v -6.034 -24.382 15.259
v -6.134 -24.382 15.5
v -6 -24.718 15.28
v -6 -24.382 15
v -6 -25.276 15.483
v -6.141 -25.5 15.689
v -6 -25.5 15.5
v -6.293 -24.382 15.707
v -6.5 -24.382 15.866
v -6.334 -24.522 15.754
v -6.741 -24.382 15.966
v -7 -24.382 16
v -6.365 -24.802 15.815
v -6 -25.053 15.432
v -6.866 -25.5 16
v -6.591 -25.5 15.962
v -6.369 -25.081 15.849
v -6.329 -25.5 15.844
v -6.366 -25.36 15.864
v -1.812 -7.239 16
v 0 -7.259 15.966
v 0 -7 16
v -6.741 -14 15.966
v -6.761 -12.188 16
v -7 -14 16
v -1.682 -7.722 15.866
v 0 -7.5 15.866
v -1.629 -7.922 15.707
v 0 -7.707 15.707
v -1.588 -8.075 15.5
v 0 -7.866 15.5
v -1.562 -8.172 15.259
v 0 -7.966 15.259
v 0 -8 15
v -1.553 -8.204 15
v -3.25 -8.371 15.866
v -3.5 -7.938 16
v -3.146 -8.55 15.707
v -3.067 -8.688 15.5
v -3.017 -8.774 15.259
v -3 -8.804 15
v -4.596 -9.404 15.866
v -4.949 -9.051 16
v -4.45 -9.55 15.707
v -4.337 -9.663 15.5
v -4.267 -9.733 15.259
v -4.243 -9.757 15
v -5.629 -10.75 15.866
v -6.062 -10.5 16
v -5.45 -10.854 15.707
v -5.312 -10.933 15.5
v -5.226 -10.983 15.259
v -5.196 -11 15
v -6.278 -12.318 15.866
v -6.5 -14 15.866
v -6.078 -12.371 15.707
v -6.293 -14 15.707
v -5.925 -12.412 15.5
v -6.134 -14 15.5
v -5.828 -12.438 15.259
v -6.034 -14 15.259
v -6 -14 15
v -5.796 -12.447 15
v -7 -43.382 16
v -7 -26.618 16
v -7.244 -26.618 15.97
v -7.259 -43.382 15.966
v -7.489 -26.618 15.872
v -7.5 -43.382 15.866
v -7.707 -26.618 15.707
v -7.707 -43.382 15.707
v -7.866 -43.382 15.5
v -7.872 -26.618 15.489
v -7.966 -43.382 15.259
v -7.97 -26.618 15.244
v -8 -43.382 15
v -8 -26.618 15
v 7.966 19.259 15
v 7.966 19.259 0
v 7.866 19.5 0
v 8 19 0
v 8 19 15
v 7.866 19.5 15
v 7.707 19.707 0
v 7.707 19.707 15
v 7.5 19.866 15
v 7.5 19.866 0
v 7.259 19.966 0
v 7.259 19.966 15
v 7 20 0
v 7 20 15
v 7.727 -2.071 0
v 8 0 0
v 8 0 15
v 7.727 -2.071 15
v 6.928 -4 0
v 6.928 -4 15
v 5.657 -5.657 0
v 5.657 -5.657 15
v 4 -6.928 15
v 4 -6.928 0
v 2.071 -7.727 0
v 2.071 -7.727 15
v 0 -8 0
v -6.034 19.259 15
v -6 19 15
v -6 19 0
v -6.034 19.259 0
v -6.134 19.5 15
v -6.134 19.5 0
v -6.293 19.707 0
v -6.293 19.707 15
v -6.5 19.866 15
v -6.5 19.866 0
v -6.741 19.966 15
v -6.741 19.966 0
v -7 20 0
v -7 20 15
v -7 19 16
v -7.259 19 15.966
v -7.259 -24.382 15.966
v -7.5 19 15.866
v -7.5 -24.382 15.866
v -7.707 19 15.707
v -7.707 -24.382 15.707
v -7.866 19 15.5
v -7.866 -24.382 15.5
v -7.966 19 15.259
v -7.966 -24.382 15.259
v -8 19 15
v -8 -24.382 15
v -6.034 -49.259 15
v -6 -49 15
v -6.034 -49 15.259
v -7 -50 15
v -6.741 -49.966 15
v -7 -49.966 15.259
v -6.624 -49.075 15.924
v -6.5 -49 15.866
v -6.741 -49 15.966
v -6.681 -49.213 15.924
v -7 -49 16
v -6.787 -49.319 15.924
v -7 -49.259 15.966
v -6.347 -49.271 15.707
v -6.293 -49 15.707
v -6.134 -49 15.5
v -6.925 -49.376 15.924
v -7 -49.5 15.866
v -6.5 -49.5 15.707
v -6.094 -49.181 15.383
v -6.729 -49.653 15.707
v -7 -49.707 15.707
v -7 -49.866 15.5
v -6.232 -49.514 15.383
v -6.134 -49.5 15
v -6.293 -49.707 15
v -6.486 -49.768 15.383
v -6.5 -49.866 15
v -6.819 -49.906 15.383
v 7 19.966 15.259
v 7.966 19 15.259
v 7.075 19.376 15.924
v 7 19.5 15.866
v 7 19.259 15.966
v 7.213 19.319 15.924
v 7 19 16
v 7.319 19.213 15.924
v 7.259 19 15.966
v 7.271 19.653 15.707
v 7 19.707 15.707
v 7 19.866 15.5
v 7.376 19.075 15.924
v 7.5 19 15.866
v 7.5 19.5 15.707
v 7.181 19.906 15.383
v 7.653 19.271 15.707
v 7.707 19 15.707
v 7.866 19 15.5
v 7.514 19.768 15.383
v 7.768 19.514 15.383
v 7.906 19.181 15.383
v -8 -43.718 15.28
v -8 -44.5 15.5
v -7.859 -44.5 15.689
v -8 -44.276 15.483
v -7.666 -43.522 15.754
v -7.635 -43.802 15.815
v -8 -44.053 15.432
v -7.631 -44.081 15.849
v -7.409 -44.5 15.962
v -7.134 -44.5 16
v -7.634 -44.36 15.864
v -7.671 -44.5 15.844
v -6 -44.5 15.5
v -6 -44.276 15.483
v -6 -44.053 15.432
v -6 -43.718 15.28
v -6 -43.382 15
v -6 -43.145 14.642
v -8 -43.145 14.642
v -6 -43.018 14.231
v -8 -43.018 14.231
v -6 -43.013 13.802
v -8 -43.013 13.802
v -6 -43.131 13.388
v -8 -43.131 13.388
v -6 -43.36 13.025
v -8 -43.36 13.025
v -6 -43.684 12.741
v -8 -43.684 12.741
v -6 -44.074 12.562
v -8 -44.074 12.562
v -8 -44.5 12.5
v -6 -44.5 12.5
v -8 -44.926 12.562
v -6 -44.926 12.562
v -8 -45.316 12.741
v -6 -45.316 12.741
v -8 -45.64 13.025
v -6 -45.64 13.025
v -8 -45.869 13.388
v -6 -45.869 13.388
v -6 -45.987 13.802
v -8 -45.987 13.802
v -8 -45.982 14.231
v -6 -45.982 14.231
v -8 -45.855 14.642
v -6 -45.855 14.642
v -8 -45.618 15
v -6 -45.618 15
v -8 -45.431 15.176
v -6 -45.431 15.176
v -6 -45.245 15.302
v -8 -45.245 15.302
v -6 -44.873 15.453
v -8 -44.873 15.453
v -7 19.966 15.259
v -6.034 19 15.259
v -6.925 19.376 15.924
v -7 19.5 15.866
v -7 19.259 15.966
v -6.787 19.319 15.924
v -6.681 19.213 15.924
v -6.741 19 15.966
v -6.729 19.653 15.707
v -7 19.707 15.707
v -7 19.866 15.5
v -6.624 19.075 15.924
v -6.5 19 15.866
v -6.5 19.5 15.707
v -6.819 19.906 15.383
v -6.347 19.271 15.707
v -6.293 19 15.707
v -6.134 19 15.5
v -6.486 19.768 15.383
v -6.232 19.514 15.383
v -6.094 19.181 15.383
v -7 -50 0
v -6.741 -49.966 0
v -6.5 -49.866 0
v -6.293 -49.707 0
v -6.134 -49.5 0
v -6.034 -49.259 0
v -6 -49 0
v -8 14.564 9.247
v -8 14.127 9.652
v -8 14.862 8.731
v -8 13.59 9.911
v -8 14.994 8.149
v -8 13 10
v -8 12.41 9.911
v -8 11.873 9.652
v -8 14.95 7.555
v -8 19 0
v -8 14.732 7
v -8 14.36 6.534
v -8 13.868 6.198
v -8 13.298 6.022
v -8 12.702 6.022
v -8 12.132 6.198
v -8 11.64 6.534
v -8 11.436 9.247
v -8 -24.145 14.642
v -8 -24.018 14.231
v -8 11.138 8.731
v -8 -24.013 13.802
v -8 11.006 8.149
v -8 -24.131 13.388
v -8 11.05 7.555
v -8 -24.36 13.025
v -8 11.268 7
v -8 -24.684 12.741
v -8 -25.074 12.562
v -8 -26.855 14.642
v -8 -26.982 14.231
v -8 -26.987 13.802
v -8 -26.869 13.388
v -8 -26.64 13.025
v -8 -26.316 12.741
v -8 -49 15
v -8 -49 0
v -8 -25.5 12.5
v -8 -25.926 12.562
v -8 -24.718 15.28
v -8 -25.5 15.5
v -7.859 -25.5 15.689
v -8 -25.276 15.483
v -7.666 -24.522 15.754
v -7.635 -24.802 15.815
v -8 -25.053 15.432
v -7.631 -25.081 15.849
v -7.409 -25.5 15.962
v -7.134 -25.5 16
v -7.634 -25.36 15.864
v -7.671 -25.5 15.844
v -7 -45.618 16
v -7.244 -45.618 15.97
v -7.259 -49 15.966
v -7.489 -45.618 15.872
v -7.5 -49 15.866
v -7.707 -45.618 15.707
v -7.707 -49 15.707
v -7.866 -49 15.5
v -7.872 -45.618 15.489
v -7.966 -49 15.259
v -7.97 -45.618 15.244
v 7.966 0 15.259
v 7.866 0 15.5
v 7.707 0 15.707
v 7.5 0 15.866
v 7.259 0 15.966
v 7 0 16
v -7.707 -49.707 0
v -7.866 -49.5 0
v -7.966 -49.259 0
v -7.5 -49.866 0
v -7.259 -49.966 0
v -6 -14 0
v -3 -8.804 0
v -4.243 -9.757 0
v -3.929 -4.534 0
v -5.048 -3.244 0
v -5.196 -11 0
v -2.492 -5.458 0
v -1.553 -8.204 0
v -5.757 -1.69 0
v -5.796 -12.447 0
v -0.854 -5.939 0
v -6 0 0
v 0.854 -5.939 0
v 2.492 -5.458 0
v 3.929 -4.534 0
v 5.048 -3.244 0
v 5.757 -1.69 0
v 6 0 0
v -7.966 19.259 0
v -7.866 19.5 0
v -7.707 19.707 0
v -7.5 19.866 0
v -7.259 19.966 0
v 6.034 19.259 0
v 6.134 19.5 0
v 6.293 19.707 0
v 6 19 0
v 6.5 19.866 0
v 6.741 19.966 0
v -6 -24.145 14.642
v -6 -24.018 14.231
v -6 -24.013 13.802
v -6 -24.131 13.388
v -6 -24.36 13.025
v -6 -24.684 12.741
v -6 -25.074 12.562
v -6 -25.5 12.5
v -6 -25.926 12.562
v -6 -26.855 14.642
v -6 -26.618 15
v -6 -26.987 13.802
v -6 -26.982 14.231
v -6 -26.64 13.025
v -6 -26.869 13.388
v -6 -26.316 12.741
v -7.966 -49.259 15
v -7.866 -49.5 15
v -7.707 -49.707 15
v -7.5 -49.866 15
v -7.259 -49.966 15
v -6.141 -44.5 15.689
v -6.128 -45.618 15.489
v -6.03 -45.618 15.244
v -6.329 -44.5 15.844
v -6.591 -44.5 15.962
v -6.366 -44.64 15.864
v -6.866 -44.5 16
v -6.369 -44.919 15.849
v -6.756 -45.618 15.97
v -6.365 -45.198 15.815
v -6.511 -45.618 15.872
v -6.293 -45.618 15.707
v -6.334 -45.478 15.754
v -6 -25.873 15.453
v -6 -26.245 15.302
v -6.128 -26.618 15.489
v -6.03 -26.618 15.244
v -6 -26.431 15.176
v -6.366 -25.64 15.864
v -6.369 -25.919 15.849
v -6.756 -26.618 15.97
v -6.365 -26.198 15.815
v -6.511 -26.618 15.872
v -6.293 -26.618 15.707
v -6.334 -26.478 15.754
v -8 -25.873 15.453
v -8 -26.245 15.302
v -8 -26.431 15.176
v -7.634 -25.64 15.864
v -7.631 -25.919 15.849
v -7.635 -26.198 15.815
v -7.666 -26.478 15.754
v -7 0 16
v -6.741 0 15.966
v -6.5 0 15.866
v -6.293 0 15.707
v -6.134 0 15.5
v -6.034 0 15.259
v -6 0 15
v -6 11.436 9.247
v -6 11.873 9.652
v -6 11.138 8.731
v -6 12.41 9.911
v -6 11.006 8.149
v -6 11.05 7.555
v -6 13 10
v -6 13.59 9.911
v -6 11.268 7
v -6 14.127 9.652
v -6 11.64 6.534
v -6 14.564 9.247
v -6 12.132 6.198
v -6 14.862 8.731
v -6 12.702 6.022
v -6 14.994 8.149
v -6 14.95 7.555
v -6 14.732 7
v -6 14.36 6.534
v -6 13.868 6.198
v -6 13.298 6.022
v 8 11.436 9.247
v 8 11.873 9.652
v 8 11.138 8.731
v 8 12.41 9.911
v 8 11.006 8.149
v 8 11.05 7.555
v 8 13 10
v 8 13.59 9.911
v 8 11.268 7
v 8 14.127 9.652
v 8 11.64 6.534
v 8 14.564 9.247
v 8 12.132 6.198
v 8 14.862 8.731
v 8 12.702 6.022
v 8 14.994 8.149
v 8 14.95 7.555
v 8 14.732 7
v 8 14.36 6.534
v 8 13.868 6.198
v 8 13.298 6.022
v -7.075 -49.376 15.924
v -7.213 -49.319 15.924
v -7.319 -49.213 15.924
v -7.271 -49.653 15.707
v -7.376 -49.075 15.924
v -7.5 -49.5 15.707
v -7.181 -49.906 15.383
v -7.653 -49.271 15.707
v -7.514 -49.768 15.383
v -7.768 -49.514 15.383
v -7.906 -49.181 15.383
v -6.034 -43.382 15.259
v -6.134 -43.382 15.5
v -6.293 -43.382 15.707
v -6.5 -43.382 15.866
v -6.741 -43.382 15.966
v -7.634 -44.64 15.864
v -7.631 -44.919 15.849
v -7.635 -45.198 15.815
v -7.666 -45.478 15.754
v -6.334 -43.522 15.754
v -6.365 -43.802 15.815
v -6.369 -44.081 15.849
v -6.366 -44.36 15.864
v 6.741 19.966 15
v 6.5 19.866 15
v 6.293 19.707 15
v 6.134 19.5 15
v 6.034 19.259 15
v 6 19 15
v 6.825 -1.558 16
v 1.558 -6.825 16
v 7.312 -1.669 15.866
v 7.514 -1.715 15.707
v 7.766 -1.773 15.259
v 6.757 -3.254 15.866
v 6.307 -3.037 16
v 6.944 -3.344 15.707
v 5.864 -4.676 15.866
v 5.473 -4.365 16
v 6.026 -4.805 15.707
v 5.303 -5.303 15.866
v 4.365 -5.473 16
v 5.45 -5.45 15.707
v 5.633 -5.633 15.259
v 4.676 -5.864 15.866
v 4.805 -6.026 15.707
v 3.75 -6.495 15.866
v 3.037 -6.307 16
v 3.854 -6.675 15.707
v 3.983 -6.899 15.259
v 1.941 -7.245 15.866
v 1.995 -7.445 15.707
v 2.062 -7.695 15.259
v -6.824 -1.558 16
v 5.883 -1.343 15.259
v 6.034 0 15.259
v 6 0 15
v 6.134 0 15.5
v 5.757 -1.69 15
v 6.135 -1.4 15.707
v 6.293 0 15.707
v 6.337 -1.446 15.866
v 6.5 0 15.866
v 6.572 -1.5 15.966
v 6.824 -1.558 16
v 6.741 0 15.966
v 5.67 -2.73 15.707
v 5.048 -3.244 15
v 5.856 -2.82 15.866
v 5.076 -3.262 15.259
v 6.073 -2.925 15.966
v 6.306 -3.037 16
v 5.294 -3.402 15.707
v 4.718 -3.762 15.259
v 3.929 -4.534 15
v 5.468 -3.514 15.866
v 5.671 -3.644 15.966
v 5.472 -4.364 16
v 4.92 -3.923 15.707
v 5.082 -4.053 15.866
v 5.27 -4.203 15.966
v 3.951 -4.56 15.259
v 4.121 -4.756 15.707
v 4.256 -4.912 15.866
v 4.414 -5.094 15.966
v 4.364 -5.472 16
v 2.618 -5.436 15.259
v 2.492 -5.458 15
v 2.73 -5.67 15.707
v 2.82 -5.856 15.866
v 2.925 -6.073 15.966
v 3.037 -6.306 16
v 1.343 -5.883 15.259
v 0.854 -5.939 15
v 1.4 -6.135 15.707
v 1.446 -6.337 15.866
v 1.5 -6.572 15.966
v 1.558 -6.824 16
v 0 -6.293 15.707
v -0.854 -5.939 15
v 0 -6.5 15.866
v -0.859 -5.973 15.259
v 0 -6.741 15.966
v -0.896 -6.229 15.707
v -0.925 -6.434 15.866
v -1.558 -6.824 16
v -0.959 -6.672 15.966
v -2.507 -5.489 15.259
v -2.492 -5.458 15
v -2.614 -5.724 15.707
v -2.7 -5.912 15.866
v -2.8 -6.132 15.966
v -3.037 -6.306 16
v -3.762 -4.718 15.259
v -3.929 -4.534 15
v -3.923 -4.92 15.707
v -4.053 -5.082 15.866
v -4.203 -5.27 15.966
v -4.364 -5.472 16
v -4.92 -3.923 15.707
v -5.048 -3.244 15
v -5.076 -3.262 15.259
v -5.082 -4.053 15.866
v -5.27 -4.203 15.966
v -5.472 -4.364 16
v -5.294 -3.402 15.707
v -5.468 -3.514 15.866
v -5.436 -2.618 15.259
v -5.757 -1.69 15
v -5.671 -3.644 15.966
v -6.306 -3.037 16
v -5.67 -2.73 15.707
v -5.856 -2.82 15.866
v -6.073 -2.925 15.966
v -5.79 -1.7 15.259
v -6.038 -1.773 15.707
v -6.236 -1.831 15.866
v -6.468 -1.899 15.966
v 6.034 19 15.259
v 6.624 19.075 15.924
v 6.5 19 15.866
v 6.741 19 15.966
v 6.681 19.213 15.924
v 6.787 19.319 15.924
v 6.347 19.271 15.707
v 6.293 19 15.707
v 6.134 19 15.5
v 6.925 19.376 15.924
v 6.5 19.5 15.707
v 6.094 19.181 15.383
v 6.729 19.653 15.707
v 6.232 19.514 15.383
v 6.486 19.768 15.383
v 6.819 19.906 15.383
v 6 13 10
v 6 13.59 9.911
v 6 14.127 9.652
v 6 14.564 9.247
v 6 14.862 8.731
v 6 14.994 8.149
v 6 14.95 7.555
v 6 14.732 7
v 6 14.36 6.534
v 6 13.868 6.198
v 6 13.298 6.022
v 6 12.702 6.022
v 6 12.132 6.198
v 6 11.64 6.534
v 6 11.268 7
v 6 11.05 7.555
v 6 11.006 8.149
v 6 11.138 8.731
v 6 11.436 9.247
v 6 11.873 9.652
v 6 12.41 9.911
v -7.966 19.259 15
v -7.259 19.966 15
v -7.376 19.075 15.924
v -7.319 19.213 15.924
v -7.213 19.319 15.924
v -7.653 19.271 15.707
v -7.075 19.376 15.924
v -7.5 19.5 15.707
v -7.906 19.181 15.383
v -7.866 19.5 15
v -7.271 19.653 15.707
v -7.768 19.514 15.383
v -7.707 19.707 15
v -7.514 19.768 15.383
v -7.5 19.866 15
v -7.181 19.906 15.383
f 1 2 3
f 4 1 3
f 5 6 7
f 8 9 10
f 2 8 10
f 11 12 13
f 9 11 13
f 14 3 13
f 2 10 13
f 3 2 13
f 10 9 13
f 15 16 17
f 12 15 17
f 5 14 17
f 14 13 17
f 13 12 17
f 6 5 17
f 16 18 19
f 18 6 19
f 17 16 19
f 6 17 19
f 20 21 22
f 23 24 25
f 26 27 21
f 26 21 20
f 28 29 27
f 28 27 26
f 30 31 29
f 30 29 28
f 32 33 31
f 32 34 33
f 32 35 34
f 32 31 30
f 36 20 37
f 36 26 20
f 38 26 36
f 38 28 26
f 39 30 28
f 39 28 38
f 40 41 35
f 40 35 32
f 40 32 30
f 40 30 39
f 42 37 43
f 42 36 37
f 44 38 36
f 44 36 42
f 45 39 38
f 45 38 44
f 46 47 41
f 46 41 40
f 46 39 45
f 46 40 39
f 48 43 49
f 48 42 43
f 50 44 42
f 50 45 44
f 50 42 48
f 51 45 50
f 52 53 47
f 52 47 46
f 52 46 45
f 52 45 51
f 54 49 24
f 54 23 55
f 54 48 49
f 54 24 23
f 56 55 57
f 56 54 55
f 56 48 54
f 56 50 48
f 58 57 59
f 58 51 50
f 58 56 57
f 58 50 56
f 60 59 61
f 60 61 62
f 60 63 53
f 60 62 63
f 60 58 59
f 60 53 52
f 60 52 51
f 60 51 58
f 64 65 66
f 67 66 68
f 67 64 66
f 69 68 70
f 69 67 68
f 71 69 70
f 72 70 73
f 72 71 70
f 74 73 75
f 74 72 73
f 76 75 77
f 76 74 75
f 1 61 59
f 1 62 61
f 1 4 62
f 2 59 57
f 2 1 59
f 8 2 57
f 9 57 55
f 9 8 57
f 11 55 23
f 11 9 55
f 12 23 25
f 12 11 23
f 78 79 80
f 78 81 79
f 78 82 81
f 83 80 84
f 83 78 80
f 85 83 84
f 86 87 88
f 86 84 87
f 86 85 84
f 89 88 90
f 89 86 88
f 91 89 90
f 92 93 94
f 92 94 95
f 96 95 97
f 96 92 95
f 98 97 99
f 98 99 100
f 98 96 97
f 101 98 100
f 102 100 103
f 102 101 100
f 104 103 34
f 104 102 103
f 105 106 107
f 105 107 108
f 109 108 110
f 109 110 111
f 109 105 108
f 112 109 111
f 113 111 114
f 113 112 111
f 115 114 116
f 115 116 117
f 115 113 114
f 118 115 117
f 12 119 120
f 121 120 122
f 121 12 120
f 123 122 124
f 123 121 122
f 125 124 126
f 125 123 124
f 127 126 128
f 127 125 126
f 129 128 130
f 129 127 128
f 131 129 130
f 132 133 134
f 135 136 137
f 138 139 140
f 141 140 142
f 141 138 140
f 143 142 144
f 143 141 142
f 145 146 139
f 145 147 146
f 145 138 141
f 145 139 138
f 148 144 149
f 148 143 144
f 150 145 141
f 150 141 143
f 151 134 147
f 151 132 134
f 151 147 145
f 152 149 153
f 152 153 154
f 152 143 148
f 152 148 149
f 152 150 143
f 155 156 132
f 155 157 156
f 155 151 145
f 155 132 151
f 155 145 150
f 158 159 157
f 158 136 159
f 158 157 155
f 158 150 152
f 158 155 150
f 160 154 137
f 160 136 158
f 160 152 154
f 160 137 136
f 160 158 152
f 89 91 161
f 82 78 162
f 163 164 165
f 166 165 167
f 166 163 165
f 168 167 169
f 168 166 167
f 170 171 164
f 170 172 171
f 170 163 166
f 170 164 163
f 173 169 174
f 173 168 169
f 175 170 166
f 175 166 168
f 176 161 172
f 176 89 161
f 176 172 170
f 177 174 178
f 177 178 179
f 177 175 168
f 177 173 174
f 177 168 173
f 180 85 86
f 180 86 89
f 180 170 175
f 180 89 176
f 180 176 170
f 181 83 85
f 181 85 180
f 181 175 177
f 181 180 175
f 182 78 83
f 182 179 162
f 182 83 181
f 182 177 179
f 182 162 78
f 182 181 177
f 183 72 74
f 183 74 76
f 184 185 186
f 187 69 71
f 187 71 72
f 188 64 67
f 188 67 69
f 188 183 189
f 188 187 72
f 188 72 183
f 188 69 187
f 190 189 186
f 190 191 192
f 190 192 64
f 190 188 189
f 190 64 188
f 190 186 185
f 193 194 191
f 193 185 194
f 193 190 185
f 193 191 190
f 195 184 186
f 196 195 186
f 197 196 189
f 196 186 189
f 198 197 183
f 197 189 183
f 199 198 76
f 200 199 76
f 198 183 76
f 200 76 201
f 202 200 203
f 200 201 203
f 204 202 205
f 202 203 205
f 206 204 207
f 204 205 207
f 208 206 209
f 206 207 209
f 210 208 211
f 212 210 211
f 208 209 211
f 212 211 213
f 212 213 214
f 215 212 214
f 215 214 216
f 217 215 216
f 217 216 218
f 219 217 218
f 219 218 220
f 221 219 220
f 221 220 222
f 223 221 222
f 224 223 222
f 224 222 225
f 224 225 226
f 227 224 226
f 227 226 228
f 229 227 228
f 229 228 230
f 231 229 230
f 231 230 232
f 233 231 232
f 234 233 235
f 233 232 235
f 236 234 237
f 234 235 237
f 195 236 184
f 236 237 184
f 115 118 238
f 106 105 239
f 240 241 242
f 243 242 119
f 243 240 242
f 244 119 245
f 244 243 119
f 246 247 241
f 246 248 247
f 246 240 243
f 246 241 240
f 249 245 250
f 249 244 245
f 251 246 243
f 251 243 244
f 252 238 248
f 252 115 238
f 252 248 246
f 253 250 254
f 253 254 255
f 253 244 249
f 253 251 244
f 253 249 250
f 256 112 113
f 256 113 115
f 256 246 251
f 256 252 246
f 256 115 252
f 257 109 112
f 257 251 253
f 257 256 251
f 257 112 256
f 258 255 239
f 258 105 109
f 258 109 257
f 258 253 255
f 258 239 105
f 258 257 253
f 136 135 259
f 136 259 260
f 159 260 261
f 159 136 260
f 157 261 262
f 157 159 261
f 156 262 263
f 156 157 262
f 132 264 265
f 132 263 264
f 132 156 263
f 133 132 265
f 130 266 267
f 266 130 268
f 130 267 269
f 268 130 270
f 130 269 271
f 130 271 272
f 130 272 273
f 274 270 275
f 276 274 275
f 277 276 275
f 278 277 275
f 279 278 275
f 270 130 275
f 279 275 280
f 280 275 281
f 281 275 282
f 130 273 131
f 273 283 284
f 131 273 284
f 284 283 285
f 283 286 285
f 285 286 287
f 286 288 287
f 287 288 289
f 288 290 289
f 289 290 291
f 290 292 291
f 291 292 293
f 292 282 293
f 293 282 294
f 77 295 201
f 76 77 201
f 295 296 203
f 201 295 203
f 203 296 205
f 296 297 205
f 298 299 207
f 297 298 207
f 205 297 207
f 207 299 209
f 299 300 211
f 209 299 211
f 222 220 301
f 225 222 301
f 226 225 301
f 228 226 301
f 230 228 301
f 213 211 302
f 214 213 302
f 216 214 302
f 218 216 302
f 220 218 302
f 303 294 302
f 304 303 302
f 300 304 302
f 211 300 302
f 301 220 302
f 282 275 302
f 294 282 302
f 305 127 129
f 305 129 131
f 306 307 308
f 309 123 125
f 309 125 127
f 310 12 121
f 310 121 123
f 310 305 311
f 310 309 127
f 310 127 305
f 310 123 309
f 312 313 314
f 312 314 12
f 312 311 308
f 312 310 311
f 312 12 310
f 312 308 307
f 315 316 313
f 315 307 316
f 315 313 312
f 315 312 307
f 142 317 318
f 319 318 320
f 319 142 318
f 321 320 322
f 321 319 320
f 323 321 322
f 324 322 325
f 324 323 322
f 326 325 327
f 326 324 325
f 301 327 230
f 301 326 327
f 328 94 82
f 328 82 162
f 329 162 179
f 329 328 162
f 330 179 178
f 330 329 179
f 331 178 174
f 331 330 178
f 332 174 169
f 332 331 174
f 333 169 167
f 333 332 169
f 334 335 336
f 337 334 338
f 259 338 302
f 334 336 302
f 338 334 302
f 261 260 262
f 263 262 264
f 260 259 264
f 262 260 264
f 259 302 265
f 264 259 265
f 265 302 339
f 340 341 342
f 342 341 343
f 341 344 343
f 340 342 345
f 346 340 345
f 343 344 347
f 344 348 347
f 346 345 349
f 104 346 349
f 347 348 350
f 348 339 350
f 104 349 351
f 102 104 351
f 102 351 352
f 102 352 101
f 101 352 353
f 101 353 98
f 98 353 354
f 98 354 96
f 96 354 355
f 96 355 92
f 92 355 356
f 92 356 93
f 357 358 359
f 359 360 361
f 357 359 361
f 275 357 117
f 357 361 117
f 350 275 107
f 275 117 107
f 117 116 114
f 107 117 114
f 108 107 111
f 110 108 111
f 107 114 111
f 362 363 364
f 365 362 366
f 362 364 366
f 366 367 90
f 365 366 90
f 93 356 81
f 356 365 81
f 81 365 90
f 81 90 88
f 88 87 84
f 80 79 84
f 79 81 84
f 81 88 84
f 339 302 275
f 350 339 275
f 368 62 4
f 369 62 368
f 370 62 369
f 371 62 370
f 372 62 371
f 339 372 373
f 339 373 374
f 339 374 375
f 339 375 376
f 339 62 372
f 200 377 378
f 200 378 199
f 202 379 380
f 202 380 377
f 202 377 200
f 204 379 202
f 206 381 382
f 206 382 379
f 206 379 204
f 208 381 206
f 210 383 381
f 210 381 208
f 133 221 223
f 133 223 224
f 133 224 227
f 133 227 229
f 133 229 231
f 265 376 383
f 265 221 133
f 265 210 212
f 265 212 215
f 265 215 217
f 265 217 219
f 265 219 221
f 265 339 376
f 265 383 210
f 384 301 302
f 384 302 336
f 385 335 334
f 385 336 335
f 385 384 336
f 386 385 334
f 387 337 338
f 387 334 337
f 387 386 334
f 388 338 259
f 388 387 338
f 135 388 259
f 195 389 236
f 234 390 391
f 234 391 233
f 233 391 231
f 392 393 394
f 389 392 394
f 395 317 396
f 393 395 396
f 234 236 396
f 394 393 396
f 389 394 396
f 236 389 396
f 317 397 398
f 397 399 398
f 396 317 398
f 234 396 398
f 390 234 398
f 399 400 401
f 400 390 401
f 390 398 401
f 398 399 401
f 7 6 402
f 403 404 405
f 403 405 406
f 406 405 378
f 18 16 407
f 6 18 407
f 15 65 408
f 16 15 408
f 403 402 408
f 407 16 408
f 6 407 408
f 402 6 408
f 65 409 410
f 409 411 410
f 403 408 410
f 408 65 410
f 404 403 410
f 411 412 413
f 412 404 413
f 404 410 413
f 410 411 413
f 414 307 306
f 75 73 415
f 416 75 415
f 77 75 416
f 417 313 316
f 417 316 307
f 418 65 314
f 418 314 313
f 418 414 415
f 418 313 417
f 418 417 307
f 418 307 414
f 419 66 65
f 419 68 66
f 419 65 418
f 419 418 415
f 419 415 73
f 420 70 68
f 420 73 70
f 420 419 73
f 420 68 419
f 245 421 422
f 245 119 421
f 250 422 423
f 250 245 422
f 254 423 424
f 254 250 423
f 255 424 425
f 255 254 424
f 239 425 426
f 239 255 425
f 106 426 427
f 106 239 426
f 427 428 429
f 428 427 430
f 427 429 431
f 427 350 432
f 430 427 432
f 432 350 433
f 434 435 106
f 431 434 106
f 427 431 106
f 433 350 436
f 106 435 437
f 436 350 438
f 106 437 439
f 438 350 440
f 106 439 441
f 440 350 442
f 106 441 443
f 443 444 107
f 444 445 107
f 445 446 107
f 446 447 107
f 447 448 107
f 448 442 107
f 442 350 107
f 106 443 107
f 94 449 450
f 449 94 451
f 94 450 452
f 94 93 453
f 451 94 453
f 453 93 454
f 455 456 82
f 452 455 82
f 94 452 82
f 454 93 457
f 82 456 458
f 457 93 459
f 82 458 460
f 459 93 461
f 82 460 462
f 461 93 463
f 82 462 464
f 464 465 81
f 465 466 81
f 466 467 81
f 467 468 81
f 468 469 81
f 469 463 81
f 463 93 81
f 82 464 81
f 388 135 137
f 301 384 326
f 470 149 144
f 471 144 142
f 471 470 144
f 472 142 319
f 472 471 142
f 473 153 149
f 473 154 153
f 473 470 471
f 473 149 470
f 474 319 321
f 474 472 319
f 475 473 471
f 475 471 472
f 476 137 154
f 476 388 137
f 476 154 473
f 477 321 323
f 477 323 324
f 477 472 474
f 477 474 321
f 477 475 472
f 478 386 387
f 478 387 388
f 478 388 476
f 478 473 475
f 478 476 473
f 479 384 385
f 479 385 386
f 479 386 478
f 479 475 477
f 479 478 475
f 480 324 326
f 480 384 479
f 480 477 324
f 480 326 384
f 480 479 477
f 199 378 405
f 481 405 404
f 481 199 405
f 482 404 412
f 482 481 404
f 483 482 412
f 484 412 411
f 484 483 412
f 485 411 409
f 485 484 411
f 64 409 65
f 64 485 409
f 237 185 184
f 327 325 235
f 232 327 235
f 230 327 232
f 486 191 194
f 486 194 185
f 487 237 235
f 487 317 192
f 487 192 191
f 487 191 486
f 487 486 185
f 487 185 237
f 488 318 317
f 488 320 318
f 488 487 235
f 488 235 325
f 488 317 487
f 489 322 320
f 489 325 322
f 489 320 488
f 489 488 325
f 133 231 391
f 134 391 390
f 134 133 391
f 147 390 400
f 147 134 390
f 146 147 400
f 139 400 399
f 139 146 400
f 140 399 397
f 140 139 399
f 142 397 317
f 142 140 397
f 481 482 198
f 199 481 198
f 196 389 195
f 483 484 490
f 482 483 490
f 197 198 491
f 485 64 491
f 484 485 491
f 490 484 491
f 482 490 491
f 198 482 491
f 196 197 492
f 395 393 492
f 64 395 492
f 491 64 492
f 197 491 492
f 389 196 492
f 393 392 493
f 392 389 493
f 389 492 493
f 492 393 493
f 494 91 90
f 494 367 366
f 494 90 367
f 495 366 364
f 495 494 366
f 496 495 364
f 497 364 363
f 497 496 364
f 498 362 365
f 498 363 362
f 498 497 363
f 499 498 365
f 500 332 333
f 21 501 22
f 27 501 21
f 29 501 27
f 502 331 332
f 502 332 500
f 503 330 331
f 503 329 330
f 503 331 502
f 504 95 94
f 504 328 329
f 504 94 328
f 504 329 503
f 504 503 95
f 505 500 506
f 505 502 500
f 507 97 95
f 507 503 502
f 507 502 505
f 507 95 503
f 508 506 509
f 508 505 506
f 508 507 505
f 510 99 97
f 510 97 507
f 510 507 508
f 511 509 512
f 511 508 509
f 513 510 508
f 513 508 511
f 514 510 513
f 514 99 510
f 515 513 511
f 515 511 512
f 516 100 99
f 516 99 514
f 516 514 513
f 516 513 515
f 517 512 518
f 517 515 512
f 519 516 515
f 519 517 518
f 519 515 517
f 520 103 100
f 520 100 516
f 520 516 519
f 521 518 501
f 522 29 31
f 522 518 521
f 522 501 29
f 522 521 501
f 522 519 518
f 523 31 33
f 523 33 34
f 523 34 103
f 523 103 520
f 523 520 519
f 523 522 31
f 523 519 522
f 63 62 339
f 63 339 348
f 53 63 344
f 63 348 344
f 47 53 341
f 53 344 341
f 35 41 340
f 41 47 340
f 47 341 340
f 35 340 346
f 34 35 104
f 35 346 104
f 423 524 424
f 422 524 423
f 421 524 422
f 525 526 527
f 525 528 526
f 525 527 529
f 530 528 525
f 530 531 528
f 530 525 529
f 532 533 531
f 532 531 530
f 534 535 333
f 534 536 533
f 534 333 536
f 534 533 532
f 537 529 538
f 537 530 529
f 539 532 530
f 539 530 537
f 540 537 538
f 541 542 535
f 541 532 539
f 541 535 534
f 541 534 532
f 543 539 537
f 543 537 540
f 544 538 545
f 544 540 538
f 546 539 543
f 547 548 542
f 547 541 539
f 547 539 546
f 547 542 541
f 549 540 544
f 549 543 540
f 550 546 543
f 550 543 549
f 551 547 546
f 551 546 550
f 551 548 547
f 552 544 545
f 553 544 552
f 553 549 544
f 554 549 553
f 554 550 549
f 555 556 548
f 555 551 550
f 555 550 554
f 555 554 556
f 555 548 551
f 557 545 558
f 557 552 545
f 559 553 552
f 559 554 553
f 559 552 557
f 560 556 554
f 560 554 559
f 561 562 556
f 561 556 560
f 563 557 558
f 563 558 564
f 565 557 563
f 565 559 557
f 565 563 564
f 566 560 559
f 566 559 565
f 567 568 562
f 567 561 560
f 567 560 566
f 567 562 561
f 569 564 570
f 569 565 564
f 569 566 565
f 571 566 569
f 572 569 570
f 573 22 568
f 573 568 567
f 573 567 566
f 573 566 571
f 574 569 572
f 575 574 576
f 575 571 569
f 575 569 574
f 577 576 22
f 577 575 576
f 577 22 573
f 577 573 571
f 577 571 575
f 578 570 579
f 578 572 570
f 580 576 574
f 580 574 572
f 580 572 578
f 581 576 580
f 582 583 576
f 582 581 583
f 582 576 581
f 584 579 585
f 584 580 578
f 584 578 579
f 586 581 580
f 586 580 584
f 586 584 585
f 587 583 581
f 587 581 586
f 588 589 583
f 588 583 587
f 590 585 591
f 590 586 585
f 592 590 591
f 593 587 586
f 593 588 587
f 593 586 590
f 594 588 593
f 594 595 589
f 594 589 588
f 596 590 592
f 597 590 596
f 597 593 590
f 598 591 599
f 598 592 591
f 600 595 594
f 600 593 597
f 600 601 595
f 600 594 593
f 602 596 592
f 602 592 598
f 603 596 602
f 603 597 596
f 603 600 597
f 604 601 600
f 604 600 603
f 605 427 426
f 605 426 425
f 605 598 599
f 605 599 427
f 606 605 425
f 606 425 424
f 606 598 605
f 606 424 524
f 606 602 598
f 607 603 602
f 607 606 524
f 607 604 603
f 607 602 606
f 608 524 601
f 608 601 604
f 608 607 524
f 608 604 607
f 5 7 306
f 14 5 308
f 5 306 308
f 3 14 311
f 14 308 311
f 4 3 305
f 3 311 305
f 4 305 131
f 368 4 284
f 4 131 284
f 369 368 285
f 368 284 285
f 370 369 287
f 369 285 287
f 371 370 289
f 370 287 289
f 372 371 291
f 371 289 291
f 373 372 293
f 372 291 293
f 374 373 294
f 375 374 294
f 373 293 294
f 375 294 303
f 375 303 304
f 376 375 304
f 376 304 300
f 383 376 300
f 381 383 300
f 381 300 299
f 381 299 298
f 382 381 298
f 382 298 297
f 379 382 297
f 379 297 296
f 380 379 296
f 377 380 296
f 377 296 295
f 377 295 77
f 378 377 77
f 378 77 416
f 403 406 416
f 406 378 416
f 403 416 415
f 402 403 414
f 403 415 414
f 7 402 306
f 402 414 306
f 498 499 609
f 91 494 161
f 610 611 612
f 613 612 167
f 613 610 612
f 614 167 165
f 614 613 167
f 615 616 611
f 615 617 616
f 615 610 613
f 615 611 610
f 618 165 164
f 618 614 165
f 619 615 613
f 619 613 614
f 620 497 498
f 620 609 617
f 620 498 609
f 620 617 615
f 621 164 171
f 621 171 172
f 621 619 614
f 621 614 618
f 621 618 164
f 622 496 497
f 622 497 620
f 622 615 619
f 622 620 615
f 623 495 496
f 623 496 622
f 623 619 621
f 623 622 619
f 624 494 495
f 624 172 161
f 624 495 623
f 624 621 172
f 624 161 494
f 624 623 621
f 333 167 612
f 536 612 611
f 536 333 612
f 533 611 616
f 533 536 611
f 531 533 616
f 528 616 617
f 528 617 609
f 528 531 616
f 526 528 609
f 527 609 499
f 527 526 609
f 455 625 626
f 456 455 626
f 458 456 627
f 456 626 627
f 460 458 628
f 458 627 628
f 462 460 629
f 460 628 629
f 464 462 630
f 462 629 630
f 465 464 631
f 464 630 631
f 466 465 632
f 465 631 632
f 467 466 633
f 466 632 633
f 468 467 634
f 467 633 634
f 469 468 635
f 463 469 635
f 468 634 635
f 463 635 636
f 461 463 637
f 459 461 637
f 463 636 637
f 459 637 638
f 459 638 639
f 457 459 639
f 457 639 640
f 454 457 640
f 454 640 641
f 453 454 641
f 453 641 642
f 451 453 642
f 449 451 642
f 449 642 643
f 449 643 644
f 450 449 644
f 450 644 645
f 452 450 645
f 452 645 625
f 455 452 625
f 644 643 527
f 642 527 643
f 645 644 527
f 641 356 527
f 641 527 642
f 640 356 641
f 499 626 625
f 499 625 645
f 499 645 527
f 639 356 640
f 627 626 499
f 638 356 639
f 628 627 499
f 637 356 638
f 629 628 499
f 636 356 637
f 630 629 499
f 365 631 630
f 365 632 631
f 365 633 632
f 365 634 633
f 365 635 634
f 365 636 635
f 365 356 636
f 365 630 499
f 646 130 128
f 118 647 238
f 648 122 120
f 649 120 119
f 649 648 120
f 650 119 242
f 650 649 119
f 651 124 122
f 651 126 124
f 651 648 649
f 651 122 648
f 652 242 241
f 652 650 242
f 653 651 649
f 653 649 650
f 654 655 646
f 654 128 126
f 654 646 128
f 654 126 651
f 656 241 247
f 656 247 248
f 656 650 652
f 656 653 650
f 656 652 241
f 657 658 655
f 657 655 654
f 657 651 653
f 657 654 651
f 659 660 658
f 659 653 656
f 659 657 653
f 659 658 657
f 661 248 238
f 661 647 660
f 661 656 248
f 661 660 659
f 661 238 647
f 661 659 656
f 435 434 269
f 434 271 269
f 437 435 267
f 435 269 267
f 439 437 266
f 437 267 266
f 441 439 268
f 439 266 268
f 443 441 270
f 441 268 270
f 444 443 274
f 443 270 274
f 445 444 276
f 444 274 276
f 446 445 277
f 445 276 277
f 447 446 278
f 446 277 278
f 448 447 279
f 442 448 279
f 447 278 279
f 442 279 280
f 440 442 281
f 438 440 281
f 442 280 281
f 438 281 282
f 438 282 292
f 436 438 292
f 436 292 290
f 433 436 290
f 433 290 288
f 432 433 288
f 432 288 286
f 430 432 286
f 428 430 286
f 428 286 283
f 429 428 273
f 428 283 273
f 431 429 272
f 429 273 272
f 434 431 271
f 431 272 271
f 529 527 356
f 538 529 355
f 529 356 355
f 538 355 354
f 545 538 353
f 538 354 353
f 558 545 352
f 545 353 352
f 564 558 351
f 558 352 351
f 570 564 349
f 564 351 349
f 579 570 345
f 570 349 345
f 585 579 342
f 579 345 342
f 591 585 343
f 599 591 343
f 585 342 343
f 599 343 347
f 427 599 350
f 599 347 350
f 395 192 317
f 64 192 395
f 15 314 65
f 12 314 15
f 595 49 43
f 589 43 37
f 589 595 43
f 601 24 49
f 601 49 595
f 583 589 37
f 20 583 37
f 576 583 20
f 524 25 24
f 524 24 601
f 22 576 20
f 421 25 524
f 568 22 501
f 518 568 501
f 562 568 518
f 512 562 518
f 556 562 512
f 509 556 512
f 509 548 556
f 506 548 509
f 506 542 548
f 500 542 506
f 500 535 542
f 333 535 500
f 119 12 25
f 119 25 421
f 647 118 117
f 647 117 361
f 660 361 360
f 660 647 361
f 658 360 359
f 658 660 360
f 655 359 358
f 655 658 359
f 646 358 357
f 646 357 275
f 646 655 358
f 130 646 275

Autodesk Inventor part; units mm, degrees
ref_plane "YZ Plane" through (0, 0, 0) normal (1, 0, 0) x (0, 1, 0)
ref_plane "XZ Plane" through (0, 0, 0) normal (0, 1, 0) x (-1, 0, 0)
ref_plane "XY Plane" through (0, 0, 0) normal (0, 0, 1) x (1, 0, 0)
sketch "Sketch1" plane through (0, 0, 0) normal (0, 0, 1) x (1, 0, 0)
  arc A0 (-6, 0) -> (6, 0) centre (0, 0) ccw
  arc A1 (0, -8) -> (8, 0) centre (0, 0) ccw
  line L0 (-6, -14) -> (-6, -50)
  line L1 (-8, 0) -> (-8, -50)
  line L2 (-6, 0) -> (-6, 20)
  line L3 (-8, 0) -> (-8, 20)
  line L4 (6, 0) -> (6, 20)
  line L5 (8, 0) -> (8, 20)
  line L6 (-8, -50) -> (-6, -50)
  line L7 (26.4346, -8) -> (-30.23, -8) construction
  arc A2 (0, -8) -> (-6, -14) centre (0, -14) ccw
  line L8 (8, 20) -> (6, 20)
  line L9 (-6, 20) -> (-8, 20)
  arc A3 (6, 0) -> (-6, 0) centre (0, 0) ccw construction
  dimension "d0" = 12
  dimension "d1" = 2
  dimension "d2" = 42
  dimension "d3" = 20
  dimension "d4" = 20
extrude "Højde" add sketch "Sketch1" along normal blind 16
sketch "Sketch3" plane through (-8, -50, 0) normal (-1, 0, 0) x (0, 0, 1)
  line L0 (0, 0) -> (0, 70) projected
  line L1 (0, 0) -> (16, 0) projected
  line L2 (16, 70) -> (16, 0) projected
  line L3 (0, 70) -> (16, 70) projected
  line L4 (0, 42) -> (16, 42) projected
  circle A0 centre (14, 24.5) radius 1.5
  circle A1 centre (14, 5.5) radius 1.5
  line L5 (18.141, 23) -> (9.2635, 23) construction
  line L6 (18.6037, 7) -> (9.7262, 7) construction
  line L7 (14, 3.0673) -> (14, 29.9023) construction
  line L8 (17.9327, 26) -> (8.2455, 26) construction
  line L9 (10.6205, 4) -> (2.6453, 4) construction
  circle A2 centre (8, 63) radius 2
  line L10 (16, 54) -> (0, 54) construction
  point P0 (0, 50)
  dimension "d7" = 3
  dimension "d8" = 3
  dimension "d9" = 16
  dimension "d10" = 22
  dimension "d11" = 4
  dimension "d12" = 16
  dimension "d13" = 14
  dimension "d14" = 4
  dimension "d15" = 7
  dimension "d16" = 8
  dimension "d17" = 12
extrude "Monteringshuller" cut sketch "Sketch3" against normal up to surface (16 mm away) contours A0 | A1 | A2
fillet "Fillet1" radius 1 17 edges at (8, 20, 8) (6, 20, 8) (-6, 20, 8) (-8, 20, 8) (-6, -50, 8) (-8, -50, 8) (-4.2426, -9.7574, 16) (5.6569, -5.6569, 16) (8, 10, 16) (-6, -32, 16) (-6, 10, 16) (6, 10, 16) (0, -6, 16) (-8, -15, 16) (-7, -50, 16) (7, 20, 16) (-7, 20, 16)
equation "\"d4\" = d3"
equation "\"d8\" = d7"
equation "\"d16\" = 0.5 * d12"
properties part number "Ø12-Z Endstop Holder"
